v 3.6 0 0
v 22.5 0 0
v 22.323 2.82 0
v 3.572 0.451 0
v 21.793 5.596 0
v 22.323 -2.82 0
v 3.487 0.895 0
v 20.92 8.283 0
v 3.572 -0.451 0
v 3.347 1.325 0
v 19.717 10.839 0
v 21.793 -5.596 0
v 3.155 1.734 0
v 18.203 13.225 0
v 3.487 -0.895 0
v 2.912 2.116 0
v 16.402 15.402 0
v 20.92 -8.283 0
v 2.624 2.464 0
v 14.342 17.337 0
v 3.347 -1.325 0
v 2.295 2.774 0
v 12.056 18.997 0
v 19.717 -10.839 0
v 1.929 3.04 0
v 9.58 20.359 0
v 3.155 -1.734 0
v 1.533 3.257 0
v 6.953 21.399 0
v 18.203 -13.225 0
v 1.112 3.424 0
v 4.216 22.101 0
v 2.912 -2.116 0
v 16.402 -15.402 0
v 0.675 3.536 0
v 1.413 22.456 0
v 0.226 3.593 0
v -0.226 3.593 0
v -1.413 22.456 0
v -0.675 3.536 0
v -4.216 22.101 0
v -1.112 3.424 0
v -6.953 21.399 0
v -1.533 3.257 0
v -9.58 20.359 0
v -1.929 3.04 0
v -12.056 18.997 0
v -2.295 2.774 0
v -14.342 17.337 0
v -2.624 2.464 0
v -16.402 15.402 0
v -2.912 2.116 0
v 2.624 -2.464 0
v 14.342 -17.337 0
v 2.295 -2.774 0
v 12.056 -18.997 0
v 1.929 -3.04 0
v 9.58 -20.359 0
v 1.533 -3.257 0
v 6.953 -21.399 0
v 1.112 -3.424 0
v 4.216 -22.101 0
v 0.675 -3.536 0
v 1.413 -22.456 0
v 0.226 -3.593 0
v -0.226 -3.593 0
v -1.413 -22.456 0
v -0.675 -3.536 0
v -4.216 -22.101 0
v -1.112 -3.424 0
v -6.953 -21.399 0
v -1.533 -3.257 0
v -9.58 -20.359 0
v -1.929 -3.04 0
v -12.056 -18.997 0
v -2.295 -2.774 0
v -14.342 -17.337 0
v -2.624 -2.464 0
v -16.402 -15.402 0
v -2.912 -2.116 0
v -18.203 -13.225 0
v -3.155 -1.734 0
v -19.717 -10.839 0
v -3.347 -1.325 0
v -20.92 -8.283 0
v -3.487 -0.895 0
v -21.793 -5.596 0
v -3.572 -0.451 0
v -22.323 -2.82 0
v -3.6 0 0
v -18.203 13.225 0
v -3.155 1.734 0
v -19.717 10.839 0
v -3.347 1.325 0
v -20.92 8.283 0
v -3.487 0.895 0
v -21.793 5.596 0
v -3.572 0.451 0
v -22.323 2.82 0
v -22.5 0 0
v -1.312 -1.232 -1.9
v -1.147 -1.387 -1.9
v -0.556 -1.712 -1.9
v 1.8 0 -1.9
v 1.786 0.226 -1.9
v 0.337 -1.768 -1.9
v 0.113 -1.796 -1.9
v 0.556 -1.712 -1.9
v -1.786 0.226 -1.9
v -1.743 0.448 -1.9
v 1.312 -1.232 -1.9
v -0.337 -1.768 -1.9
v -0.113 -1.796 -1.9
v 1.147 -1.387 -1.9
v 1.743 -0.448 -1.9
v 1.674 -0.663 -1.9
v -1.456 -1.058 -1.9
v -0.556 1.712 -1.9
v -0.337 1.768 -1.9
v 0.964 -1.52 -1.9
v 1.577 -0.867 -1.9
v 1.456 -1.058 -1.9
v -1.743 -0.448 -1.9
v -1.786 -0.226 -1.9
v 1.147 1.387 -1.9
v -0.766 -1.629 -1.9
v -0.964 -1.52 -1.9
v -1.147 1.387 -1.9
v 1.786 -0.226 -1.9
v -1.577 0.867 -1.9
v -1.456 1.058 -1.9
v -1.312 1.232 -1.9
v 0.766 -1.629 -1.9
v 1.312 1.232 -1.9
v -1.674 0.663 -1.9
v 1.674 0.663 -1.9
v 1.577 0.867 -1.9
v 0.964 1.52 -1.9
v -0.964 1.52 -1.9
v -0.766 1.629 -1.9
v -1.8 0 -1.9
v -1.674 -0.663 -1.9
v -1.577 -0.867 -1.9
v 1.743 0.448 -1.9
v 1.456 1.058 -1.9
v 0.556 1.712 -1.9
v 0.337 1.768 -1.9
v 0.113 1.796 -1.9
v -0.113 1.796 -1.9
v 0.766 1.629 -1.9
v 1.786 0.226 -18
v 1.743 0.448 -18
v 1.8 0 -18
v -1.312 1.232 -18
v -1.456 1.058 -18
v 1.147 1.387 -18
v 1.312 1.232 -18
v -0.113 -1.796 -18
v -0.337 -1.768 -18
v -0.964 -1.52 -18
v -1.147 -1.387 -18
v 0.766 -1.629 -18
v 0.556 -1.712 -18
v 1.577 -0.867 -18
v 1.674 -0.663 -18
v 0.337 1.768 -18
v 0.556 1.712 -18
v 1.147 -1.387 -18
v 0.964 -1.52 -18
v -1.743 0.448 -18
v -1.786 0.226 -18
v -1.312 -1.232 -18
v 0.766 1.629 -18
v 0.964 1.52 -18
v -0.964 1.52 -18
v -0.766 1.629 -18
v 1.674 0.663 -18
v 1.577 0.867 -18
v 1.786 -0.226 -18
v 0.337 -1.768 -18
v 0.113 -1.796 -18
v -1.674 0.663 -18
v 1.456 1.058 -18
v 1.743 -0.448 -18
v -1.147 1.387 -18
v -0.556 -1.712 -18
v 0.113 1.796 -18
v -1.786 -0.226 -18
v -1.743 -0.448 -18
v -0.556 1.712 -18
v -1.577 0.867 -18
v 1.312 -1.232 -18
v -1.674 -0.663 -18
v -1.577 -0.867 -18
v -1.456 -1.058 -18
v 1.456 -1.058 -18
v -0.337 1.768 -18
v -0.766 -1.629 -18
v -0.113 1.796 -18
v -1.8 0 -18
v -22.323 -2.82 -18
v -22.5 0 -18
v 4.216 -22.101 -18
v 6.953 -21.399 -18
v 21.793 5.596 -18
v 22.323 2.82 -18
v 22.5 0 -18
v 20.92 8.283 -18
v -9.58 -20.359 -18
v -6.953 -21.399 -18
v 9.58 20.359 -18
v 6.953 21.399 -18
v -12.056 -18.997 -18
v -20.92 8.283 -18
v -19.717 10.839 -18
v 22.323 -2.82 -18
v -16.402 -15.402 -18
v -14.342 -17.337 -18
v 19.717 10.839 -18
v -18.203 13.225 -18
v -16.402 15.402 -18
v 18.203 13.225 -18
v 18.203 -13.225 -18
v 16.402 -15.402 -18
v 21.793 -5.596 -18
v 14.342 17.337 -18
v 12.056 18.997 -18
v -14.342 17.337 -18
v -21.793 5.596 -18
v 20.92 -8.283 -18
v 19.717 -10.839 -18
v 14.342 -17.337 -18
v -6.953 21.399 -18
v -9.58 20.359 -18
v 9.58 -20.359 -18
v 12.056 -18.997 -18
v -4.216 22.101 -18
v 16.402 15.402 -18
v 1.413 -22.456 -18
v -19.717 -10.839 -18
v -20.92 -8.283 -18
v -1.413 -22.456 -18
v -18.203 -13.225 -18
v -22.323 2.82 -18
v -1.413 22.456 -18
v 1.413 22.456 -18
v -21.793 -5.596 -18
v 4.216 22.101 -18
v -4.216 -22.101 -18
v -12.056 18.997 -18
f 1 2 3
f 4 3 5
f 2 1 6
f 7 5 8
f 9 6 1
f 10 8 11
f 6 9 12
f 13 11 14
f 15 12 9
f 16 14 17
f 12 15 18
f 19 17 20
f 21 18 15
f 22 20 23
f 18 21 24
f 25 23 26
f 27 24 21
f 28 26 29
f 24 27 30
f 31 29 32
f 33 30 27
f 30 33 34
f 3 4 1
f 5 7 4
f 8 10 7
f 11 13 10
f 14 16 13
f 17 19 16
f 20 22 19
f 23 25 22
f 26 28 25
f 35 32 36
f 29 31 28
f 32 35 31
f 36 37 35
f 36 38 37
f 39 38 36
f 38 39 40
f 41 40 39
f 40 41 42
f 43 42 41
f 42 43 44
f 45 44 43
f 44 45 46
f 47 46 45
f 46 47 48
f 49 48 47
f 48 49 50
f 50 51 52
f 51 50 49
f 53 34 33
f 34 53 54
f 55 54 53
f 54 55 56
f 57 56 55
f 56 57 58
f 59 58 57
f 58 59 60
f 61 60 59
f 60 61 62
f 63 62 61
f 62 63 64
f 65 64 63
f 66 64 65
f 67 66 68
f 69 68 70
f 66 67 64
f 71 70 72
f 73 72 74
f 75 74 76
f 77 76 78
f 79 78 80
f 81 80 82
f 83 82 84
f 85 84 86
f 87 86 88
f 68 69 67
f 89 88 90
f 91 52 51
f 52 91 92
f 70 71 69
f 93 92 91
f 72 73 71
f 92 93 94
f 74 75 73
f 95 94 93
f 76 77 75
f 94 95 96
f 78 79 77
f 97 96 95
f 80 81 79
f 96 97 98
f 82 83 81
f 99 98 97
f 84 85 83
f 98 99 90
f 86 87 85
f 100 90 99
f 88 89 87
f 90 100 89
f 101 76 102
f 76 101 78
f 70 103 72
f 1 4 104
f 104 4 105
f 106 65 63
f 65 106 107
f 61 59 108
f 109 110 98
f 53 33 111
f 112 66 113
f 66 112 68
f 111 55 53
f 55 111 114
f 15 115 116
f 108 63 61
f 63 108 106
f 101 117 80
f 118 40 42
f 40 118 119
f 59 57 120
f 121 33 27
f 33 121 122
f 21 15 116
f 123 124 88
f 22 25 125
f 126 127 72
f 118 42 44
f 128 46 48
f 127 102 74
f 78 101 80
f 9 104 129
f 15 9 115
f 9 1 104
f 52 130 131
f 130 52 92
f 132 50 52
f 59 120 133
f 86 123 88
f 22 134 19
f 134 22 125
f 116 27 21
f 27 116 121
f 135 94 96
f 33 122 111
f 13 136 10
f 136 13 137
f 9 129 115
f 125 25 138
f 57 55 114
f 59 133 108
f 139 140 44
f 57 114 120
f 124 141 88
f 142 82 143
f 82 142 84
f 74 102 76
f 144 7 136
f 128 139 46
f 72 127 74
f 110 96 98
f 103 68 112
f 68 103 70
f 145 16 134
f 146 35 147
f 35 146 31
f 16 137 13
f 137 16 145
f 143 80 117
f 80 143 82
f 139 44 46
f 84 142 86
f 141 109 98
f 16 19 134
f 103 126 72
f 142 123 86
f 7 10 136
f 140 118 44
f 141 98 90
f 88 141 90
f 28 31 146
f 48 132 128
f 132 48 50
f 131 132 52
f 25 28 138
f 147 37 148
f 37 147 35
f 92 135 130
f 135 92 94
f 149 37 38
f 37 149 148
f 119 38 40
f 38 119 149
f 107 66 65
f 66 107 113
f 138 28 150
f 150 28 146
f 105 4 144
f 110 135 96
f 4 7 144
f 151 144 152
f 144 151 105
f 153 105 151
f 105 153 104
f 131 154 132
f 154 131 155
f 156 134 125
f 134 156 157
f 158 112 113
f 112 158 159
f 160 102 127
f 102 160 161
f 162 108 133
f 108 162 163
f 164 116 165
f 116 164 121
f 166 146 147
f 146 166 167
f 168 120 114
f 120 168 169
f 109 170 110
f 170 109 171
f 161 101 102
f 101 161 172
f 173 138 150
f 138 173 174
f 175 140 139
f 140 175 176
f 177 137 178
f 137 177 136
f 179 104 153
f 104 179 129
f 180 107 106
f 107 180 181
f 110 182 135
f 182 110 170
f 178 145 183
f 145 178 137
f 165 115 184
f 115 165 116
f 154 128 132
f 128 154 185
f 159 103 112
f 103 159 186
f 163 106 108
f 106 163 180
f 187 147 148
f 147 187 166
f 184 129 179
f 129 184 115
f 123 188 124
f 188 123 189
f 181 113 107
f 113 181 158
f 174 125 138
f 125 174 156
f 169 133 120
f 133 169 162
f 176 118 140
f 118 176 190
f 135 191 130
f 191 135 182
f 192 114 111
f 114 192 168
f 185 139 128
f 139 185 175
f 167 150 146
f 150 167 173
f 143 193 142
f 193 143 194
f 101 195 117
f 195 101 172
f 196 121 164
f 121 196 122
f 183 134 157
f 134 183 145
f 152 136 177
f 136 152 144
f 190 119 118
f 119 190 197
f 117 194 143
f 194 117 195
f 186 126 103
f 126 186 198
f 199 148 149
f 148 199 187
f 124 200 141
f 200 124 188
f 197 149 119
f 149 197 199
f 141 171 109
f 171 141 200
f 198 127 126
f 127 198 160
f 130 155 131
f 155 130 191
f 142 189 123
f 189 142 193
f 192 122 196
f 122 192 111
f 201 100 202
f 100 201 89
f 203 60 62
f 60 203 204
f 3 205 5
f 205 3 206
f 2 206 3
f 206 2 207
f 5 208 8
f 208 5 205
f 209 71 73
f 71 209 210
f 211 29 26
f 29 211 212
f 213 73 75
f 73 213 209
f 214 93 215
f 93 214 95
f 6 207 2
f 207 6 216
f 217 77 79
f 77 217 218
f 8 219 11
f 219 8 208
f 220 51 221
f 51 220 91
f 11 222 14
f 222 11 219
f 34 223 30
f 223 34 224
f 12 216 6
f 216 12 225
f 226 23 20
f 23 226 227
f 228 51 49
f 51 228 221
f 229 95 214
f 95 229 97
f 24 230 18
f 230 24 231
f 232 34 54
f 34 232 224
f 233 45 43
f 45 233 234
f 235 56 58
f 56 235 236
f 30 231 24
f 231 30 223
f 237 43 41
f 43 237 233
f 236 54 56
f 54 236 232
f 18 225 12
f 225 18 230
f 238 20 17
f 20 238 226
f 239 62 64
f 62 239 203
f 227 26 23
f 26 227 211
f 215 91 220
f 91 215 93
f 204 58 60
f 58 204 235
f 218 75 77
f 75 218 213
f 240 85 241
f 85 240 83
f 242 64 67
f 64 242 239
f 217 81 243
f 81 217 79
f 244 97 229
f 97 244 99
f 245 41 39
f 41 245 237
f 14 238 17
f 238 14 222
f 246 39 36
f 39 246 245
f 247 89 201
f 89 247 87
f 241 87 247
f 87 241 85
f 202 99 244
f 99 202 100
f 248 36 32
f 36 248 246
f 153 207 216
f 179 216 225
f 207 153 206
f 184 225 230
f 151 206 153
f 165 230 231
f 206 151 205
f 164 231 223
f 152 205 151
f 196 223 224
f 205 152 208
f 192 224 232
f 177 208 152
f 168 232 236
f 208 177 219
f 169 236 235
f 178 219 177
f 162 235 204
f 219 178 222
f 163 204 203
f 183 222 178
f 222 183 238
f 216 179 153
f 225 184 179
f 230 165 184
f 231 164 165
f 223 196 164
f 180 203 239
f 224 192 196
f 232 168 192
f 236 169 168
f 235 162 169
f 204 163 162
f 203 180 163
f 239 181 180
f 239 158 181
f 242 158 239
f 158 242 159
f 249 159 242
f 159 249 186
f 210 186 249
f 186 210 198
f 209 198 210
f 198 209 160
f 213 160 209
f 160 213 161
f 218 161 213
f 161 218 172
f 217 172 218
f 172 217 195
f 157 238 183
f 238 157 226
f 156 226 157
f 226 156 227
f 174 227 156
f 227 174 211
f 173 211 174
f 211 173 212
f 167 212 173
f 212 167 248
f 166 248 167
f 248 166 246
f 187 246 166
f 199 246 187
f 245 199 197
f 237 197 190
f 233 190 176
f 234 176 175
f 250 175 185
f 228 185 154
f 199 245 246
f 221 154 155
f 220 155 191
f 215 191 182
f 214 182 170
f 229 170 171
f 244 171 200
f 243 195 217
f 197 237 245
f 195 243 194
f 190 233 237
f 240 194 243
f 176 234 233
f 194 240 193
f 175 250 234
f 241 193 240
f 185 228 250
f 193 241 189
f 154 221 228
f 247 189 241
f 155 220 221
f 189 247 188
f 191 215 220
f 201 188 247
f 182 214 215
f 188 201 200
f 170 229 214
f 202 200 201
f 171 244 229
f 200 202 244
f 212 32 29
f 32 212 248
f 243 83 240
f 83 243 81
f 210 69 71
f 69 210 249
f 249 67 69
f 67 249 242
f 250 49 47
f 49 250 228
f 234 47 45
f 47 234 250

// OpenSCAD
$fn = 50;

difference() {
	union() {
		translate(v = [0, 0, -18.0]) {
			cylinder(h = 18, r = 22.5);
		}
	}
	union() {
		translate(v = [0, 0, 0]) {
			rotate(a = [0, 0, 0]) {
				difference() {
					union() {
						translate(v = [0, 0, -21.0]) {
							cylinder(h = 21, r = 1.5);
						}
						translate(v = [0, 0, -1.9]) {
							cylinder(h = 1.9, r1 = 1.8, r2 = 3.6);
						}
						translate(v = [0, 0, -21.0]) {
							cylinder(h = 21, r = 1.8);
						}
						translate(v = [0, 0, -21.0]) {
							cylinder(h = 21, r = 1.5);
						}
					}
					union();
				}
			}
		}
	}
}
